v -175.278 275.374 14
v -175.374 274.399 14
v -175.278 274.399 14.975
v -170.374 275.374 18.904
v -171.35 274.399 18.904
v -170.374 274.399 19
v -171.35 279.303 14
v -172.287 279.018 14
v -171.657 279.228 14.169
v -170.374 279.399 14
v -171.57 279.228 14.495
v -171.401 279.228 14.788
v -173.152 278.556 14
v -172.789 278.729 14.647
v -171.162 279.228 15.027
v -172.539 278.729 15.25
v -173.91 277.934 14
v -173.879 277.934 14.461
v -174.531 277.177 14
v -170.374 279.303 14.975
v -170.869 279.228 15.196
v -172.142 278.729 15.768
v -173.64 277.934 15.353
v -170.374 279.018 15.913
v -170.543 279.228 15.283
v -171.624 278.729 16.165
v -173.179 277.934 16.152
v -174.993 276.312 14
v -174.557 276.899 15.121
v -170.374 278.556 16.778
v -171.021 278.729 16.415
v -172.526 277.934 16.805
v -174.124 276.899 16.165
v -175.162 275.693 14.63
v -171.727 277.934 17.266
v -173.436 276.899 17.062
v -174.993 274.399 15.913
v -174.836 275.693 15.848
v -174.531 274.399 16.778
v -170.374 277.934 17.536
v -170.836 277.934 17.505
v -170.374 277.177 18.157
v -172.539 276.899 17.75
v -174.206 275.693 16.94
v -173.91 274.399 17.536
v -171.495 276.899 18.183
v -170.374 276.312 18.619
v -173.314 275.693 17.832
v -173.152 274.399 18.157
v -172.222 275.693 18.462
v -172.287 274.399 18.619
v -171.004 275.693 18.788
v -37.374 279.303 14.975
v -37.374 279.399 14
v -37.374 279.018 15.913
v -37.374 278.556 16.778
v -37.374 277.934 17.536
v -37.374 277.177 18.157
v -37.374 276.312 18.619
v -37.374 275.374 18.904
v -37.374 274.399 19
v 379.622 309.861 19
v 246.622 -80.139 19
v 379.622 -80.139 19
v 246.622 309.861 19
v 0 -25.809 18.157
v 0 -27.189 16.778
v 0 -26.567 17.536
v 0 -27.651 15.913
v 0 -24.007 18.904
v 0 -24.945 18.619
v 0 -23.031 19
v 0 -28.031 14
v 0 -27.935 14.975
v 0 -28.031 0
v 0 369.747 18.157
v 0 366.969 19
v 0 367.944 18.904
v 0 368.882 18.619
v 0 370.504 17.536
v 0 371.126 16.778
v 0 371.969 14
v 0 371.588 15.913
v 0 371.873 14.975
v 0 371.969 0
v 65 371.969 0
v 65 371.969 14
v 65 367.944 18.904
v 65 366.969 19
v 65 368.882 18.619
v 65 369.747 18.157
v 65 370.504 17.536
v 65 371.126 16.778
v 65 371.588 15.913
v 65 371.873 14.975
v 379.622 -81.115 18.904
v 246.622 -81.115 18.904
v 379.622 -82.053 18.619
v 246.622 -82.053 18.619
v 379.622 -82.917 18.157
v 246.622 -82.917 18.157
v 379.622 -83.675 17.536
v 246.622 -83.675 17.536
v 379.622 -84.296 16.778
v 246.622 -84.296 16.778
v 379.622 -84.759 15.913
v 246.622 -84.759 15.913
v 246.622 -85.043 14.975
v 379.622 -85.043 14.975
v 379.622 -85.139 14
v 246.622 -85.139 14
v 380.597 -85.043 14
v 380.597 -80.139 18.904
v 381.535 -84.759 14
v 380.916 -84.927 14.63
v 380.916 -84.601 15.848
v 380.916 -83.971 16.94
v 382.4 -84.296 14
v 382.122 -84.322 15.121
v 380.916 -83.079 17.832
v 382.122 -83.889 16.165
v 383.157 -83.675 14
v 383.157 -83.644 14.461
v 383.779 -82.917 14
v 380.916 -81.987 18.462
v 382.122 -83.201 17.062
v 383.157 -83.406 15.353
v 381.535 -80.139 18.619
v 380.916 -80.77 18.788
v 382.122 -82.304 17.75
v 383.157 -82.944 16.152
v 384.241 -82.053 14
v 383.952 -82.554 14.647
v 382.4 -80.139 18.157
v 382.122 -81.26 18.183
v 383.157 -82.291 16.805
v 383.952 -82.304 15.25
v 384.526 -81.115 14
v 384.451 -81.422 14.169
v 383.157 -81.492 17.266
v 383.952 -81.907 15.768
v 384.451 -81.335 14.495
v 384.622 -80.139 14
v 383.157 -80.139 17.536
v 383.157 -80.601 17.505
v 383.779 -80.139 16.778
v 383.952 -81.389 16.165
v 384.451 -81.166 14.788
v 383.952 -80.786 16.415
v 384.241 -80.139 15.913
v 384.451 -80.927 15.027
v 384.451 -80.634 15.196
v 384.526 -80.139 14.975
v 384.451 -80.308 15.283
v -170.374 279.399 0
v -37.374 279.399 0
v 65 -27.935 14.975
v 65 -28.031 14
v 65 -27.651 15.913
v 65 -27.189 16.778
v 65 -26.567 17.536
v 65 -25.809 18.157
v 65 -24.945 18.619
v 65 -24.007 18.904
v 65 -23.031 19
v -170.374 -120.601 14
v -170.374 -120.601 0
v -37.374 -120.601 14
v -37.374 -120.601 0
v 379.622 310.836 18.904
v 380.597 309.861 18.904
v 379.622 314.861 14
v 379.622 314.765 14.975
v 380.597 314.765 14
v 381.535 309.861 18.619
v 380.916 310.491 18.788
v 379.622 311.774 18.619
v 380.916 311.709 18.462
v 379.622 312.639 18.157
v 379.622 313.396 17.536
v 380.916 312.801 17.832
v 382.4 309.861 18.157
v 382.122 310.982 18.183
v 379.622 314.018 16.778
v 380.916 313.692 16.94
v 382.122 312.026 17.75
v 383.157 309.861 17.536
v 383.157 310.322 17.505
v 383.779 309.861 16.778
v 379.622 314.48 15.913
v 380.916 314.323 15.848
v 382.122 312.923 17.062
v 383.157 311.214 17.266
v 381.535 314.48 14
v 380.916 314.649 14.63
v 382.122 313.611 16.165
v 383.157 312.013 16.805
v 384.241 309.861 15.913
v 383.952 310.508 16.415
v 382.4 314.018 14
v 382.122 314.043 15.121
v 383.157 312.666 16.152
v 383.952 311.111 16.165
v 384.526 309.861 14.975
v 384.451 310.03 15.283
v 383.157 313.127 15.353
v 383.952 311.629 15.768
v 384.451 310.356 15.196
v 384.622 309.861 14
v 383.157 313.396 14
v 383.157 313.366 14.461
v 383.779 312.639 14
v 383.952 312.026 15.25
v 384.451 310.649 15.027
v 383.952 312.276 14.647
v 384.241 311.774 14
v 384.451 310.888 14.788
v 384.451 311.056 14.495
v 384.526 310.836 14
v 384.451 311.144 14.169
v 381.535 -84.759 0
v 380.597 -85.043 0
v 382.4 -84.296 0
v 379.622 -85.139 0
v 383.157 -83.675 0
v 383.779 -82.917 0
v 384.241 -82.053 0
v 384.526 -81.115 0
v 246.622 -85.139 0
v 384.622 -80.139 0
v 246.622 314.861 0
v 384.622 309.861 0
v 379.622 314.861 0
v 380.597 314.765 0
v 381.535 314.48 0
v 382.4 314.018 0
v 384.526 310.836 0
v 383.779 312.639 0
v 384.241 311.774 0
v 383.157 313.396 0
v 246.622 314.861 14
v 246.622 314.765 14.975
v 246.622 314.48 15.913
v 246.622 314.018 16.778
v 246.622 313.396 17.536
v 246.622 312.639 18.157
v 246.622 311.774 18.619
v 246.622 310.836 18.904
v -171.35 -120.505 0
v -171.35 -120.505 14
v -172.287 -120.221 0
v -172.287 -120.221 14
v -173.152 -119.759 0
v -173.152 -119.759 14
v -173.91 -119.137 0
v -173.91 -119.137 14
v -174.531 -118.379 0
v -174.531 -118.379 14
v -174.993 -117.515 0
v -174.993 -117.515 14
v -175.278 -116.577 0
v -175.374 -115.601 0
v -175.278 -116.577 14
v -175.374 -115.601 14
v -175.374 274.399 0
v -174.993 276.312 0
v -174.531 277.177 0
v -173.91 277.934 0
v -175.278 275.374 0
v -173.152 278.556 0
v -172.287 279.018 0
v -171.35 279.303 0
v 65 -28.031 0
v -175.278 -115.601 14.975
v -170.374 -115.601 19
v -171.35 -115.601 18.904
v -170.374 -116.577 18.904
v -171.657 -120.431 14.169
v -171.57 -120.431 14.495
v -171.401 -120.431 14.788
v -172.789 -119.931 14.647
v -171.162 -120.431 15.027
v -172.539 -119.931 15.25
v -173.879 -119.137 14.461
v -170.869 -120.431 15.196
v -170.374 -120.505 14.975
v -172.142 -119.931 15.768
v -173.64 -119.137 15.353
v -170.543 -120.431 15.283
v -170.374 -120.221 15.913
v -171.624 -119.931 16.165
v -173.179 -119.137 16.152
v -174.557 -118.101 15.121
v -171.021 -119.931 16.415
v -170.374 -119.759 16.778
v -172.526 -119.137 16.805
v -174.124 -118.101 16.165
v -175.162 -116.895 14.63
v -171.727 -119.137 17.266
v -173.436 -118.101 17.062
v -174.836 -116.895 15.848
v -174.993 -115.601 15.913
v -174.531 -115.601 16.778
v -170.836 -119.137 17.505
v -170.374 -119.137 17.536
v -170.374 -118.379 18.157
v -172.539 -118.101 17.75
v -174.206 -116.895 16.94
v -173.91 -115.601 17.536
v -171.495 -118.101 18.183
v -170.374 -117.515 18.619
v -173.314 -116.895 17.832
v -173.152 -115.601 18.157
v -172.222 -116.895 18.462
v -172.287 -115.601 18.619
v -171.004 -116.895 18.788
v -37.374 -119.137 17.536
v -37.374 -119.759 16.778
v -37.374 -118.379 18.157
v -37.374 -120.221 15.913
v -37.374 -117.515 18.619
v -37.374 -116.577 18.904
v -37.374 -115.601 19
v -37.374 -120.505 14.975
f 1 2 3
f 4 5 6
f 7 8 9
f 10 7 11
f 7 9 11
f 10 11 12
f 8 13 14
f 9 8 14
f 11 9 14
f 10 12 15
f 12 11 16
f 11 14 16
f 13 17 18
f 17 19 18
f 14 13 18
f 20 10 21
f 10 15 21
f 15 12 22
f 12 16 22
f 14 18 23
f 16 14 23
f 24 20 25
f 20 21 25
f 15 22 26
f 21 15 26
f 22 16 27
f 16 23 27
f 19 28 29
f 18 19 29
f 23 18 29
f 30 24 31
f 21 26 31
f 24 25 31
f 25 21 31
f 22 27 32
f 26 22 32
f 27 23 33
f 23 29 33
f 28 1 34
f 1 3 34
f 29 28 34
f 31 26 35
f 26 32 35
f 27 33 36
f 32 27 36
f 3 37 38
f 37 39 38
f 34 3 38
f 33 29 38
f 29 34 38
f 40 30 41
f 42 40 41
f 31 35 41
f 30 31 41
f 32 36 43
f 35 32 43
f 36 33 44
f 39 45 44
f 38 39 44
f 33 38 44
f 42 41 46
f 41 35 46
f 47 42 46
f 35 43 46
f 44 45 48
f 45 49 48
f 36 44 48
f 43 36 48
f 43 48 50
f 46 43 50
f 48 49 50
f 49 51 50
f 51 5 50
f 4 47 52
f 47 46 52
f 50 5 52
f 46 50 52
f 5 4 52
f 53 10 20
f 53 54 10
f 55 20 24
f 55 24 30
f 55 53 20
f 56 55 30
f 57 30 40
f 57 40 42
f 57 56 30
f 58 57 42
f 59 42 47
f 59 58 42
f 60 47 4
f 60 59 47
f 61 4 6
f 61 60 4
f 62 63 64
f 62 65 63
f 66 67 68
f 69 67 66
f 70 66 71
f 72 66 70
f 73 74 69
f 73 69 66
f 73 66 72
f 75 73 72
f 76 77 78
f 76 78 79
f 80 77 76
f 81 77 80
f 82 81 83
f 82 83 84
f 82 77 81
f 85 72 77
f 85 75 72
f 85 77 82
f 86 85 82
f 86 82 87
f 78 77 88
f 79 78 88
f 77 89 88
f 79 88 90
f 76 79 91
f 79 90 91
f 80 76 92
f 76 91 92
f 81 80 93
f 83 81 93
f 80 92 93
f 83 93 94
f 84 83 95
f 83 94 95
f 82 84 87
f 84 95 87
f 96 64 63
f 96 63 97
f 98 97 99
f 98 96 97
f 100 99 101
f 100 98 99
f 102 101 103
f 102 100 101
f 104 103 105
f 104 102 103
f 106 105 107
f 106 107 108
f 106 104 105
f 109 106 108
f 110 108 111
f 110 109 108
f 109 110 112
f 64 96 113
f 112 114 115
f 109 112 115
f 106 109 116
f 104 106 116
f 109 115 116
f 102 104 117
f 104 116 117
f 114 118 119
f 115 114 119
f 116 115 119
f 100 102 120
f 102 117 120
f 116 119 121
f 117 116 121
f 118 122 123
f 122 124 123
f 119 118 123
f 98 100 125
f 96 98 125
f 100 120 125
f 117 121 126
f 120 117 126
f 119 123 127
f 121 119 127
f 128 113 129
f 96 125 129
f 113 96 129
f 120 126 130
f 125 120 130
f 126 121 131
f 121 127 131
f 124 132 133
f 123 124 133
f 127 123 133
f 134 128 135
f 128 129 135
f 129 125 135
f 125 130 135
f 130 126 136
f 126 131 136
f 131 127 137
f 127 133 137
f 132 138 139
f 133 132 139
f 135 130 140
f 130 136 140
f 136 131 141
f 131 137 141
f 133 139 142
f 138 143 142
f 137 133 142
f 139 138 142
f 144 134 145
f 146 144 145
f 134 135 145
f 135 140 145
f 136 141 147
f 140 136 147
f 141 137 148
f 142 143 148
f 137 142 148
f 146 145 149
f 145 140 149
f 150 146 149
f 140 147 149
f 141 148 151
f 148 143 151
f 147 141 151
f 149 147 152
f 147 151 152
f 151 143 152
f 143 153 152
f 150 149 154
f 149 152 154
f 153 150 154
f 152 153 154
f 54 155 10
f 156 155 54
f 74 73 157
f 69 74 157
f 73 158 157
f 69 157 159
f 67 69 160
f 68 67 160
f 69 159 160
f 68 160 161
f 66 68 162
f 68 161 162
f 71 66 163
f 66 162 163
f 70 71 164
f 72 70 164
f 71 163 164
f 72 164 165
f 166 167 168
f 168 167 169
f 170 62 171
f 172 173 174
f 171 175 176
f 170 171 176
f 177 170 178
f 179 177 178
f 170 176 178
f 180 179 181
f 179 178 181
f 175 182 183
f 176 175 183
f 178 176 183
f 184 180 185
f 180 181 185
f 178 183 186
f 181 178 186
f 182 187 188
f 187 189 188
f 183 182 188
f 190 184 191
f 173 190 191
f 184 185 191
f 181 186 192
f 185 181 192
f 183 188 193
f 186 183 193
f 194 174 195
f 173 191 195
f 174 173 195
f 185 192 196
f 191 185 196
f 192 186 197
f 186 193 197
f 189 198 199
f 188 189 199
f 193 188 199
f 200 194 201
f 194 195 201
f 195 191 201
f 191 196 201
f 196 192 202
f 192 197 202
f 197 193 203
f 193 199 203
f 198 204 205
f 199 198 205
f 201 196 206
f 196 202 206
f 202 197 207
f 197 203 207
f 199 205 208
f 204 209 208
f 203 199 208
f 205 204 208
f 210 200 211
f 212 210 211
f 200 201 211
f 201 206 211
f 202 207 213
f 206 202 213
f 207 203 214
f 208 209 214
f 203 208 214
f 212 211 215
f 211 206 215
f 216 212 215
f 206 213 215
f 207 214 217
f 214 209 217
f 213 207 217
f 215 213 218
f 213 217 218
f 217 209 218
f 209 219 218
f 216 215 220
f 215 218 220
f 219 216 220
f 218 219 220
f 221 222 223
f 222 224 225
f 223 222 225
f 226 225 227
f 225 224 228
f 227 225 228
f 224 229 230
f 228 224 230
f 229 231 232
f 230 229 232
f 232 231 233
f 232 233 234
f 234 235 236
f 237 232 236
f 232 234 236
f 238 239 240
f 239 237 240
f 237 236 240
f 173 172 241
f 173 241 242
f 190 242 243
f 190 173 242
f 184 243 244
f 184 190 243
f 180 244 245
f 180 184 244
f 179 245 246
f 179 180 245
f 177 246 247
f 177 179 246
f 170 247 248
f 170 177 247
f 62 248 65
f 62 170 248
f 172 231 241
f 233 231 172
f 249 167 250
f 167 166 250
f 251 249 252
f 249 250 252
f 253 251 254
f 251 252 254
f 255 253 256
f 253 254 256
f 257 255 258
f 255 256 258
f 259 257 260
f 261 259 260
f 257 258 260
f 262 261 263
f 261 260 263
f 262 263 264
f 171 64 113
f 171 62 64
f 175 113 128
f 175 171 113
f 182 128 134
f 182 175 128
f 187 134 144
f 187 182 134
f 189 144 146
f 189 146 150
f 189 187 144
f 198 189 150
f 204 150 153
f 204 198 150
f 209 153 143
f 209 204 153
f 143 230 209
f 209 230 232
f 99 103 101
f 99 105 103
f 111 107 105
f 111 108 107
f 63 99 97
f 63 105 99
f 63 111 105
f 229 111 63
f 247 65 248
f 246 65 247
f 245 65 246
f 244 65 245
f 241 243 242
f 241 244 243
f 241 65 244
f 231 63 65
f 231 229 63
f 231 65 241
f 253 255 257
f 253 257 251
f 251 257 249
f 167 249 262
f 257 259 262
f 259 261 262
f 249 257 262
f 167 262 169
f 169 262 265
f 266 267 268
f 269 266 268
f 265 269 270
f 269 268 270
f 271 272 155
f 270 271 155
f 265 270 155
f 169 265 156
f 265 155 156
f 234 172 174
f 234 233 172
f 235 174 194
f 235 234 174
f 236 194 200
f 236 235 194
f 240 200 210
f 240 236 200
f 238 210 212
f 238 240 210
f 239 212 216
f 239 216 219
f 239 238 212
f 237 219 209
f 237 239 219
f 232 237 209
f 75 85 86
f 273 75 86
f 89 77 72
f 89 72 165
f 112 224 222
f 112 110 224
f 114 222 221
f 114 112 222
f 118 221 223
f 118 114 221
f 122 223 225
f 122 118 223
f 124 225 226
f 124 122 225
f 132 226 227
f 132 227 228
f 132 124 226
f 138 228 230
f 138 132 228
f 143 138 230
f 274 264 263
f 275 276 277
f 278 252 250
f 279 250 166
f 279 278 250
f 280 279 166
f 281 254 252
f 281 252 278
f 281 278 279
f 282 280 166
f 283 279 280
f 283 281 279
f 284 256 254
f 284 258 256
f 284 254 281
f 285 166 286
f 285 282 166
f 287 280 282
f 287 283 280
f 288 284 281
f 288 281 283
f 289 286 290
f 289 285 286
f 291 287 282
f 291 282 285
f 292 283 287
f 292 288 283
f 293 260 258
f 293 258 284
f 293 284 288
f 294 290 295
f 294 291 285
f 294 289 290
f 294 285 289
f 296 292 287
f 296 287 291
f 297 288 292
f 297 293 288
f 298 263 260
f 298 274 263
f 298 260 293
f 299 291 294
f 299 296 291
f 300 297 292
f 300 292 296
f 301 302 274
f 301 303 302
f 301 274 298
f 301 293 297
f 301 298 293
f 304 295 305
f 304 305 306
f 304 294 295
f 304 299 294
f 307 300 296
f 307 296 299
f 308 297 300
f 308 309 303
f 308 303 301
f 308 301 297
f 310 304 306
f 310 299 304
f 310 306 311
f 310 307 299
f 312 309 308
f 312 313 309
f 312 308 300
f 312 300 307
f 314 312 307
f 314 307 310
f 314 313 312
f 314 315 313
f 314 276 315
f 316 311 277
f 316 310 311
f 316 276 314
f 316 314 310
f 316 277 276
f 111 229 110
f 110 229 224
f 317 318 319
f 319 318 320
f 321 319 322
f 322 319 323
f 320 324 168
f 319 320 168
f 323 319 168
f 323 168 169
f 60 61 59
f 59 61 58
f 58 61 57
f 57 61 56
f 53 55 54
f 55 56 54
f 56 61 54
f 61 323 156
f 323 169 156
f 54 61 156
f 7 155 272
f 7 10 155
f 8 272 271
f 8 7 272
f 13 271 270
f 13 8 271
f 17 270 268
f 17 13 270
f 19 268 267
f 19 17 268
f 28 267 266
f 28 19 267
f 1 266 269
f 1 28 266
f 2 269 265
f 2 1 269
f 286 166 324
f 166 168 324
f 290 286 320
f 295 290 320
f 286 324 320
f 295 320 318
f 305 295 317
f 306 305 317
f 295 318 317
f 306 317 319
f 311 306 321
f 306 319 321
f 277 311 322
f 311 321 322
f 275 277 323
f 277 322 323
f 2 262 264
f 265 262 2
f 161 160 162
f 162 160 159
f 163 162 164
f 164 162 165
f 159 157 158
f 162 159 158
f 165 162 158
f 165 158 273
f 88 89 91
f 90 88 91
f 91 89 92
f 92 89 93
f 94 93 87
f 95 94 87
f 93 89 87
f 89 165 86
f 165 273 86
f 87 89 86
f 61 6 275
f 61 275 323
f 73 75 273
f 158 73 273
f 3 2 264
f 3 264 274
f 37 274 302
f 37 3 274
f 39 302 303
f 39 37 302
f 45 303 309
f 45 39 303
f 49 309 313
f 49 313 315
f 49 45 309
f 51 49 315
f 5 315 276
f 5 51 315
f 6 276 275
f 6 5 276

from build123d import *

# Parameters (mm, degrees)
F0_W     = 138
F0_H     = 400
F2_W     = 65
F2_H     = 400
F1_W     = 138
F1_H     = 400
F3_DEPTH = 19
F4_R     = 5
F5_R     = 5
F6_R     = 5
F7_R     = 5
F8_R     = 5
F9_R     = 5
F10_R    = 5


with BuildPart() as f3:
    # F0 (on Top) + F2 (on Top) + F1 (on Top) → F3 (new body)
    with BuildSketch(Plane.XY):
        with Locations((-106.374081, 79.398845)):
            Rectangle(F0_W, F0_H)
    with BuildSketch(Plane.XY):
        with Locations((32.5, 171.968711)):
            Rectangle(F2_W, F2_H)
    with BuildSketch(Plane.XY):
        with Locations((315.621719, 114.860857)):
            Rectangle(F1_W, F1_H)
    extrude(amount=F3_DEPTH)

    # F4
    f4_edges = [f3.edges().sort_by_distance(p)[0] for p in [
        (-175.374081, 79.398845, 19),
    ]]
    fillet(f4_edges, radius=F4_R)

    # F5
    f5_edges = [f3.edges().sort_by_distance(p)[0] for p in [
        (-103.874081, -120.601155, 19),
        (32.5, -28.031289, 19),
    ]]
    fillet(f5_edges, radius=F5_R)

    # F6
    f6_edges = [f3.edges().sort_by_distance(p)[0] for p in [
        (-103.874081, 279.398845, 19),
    ]]
    fillet(f6_edges, radius=F6_R)

    # F7
    f7_edges = [f3.edges().sort_by_distance(p)[0] for p in [
        (32.5, 371.968711, 19),
    ]]
    fillet(f7_edges, radius=F7_R)

    # F8
    f8_edges = [f3.edges().sort_by_distance(p)[0] for p in [
        (315.621719, 314.860857, 19),
    ]]
    fillet(f8_edges, radius=F8_R)

    # F9
    f9_edges = [f3.edges().sort_by_distance(p)[0] for p in [
        (315.621719, -85.139143, 19),
    ]]
    fillet(f9_edges, radius=F9_R)

    # F10
    f10_edges = [f3.edges().sort_by_distance(p)[0] for p in [
        (384.621719, 114.860857, 19),
    ]]
    fillet(f10_edges, radius=F10_R)


solid = f3.part
